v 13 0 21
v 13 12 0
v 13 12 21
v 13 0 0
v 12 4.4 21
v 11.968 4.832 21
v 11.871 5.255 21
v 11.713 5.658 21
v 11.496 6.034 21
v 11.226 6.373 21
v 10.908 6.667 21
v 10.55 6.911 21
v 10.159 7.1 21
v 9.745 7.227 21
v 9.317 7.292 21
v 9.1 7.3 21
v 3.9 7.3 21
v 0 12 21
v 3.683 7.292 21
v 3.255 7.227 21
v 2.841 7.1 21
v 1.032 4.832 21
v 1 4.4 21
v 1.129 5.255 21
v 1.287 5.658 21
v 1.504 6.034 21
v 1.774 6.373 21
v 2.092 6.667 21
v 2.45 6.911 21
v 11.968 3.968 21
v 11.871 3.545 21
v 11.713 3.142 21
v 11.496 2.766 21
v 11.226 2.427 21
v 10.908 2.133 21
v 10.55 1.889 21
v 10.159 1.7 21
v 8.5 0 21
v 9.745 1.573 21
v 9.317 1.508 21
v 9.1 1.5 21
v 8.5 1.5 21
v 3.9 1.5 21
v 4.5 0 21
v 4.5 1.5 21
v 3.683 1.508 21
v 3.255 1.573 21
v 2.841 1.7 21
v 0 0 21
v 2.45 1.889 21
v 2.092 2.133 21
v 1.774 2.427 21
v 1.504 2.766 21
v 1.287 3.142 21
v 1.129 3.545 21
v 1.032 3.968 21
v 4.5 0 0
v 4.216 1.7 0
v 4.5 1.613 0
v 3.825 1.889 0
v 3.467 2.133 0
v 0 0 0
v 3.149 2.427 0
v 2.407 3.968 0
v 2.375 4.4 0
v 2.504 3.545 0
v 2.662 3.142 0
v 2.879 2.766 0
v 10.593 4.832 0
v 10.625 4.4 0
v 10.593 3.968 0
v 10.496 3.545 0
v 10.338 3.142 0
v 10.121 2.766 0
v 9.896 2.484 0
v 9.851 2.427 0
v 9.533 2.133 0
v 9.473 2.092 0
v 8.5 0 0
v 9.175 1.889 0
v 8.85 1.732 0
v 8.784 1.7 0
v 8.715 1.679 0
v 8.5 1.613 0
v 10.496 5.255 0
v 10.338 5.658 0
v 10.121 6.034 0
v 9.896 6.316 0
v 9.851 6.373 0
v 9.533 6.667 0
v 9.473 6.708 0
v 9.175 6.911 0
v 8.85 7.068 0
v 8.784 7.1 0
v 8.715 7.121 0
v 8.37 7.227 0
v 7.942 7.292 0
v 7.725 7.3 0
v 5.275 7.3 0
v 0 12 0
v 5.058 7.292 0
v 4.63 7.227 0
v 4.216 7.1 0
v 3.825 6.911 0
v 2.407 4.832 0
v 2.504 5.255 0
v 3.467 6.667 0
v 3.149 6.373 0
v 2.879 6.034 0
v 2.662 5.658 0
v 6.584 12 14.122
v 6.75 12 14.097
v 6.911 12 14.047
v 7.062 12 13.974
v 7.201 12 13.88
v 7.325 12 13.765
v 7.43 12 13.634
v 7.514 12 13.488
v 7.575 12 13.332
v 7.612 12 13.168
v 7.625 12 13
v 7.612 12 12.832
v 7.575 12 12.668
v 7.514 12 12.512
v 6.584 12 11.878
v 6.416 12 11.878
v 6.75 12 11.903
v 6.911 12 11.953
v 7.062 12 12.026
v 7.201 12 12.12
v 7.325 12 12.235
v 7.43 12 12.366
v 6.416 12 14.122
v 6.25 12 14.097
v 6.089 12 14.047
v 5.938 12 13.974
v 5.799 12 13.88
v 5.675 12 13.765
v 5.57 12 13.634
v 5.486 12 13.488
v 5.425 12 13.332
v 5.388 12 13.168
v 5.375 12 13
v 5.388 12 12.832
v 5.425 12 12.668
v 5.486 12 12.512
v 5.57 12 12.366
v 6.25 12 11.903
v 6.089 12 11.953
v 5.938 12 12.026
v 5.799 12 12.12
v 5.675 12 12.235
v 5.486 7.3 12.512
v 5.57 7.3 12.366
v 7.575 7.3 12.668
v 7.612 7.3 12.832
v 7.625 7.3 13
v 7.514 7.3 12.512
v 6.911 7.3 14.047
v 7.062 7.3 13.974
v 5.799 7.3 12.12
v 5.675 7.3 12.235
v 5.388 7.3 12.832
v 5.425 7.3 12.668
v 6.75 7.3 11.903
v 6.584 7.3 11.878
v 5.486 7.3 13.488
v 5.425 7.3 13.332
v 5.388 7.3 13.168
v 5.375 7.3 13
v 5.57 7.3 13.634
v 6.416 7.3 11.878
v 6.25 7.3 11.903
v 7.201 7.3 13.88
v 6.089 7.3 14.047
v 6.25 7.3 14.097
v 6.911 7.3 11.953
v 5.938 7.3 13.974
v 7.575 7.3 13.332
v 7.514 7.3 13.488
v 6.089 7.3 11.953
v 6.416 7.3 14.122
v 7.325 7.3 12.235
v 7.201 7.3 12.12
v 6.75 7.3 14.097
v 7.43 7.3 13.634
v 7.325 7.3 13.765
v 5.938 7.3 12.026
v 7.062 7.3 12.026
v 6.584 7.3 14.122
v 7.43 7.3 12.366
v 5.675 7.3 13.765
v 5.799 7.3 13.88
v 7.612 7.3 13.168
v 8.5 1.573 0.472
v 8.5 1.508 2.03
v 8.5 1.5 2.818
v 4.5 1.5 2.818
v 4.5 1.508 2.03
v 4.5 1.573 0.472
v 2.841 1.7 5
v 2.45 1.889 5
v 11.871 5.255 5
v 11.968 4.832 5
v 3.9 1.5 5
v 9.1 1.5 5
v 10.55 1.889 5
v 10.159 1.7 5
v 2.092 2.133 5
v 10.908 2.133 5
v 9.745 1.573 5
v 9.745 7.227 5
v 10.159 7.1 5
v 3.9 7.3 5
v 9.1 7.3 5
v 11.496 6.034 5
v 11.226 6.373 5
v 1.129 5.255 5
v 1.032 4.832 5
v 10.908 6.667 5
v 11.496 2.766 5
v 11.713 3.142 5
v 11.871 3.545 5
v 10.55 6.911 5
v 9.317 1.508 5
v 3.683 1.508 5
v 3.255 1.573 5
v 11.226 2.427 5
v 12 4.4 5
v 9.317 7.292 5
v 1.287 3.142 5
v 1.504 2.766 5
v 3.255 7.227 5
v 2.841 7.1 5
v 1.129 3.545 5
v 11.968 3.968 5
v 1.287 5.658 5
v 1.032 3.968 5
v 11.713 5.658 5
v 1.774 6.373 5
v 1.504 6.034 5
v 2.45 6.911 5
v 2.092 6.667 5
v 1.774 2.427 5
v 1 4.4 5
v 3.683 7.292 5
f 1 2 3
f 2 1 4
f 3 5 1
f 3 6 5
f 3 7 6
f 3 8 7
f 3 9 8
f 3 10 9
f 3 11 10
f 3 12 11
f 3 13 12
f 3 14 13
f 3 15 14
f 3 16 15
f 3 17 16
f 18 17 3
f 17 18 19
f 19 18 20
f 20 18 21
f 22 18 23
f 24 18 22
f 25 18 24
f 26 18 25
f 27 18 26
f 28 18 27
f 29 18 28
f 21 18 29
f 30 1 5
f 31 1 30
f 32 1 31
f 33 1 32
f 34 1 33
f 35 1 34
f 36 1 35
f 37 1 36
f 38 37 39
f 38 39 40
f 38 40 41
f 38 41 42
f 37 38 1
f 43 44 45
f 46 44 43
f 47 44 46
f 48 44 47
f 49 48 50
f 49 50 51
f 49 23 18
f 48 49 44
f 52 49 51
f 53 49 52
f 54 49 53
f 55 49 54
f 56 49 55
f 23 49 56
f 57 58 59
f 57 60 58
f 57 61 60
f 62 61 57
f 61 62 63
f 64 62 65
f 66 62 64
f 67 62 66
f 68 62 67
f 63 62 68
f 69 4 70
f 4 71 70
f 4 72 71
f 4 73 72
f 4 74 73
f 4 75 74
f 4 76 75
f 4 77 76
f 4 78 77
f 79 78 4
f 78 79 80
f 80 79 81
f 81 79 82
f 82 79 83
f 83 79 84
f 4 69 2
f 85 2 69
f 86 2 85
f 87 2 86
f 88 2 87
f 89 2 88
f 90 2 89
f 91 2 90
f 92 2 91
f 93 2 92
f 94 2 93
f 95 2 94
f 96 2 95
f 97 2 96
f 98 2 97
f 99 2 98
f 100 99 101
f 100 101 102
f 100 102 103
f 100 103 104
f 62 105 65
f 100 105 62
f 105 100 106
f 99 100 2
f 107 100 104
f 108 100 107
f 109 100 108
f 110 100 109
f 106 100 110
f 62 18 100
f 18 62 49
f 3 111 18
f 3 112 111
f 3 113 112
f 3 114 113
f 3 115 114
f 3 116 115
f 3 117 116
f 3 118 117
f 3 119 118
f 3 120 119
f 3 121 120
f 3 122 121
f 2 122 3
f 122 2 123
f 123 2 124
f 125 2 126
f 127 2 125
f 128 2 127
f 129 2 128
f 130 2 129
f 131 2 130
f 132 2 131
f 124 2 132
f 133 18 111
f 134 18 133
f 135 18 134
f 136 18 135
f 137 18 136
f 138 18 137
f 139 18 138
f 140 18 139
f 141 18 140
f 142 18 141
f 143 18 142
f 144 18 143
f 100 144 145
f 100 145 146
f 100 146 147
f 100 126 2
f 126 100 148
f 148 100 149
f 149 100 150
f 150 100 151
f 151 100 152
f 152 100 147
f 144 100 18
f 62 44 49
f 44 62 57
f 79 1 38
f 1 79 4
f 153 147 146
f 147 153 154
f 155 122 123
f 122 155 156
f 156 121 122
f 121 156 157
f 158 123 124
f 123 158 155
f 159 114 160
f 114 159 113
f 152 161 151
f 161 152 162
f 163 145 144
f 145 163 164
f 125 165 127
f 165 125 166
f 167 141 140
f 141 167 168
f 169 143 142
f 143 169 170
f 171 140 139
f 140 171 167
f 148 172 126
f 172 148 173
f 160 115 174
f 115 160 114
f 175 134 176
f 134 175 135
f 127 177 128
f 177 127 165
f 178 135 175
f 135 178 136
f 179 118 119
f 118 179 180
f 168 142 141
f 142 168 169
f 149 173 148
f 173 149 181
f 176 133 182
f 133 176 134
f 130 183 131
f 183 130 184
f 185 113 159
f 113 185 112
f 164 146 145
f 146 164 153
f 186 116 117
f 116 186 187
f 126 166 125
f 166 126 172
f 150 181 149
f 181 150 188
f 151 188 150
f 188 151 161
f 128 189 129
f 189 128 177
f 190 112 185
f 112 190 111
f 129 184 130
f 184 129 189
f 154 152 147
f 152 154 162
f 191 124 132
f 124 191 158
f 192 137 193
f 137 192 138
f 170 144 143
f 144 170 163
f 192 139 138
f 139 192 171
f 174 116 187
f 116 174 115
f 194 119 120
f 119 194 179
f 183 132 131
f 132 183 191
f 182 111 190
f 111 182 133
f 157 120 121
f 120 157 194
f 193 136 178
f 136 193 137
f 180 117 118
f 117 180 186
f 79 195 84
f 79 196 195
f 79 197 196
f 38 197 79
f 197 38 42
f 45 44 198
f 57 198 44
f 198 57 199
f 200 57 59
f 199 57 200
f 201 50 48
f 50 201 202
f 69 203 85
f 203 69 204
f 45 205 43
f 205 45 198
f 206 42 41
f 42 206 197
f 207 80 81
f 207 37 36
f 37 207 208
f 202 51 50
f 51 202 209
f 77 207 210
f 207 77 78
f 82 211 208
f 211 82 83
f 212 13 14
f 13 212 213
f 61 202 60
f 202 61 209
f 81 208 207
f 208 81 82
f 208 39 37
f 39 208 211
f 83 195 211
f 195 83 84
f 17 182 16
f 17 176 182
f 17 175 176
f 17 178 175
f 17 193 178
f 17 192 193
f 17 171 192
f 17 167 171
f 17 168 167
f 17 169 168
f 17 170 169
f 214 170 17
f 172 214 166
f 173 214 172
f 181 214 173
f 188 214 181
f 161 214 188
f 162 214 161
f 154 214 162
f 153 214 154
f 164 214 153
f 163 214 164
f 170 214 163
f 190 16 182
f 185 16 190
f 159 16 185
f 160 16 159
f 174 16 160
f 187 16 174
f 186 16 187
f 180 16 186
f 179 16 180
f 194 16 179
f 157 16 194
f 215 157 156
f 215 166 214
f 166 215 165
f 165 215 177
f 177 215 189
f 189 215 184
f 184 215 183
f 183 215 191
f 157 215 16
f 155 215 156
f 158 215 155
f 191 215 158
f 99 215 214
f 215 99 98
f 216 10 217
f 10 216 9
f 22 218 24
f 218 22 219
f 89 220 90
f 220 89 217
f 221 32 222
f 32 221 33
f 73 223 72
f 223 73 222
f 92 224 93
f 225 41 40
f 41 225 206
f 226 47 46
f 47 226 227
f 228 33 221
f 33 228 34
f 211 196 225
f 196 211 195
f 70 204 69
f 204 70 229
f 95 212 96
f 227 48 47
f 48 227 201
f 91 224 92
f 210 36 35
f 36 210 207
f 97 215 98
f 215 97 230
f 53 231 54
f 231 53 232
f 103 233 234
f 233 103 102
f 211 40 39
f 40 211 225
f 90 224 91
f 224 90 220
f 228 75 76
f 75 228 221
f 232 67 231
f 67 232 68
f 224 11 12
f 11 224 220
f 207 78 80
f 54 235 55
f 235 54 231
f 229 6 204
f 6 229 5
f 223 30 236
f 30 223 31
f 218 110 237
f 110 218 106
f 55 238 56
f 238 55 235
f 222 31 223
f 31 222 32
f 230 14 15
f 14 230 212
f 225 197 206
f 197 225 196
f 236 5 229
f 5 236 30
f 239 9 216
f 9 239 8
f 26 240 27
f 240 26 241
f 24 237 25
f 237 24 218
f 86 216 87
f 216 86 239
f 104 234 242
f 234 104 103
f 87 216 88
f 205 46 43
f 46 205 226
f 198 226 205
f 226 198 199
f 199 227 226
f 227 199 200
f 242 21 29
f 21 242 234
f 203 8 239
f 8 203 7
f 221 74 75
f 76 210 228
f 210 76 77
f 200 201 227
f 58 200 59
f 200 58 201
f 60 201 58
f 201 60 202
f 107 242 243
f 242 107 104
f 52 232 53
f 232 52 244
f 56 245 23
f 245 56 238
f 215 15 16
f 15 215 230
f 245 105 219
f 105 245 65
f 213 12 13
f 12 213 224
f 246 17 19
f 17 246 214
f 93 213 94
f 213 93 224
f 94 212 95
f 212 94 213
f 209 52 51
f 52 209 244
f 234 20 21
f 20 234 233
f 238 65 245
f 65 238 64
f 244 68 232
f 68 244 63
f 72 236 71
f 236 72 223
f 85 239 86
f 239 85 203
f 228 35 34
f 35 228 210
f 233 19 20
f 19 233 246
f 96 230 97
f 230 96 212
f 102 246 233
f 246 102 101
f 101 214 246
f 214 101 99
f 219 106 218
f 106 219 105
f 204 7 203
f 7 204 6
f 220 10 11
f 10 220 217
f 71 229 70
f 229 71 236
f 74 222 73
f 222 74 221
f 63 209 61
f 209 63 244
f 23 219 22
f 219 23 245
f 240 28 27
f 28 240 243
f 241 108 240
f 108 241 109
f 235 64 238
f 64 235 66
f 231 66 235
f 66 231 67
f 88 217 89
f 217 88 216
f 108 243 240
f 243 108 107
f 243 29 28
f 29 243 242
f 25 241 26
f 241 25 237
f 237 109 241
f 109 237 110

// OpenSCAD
w = 13.0;
d = 12.0;
h = 21.0;

cut = 4.0;
hole = 2.25;
off = 13.0;

usb_dia = 5.8;
usb_w = 11.0;
usb_off = 1.5;

$fn = 42;

usb_bottom_h = 4.5 + 1.5;
usb_w_bottom = 7.7;

module usb_internal(h, w) {
    translate([(usb_dia - w) / 2, 0, 0]) {
        cylinder(d = usb_dia, h = h);
        
        translate([w - usb_dia, 0, 0])
        cylinder(d = usb_dia, h = h);
        
        translate([0, -usb_dia / 2, 0])
        cube([w - usb_dia, usb_dia, h]);
    }
}

module usb(h) {
    hull() {
        translate([0, 0, usb_bottom_h])
        usb_internal(h - usb_bottom_h, usb_w);
        
        usb_internal(usb_bottom_h, usb_w_bottom);
    }
}

module holder() {
    difference() {
        cube([w, d, h]);
        
        translate([w / 2, -1, off])
        rotate([-90, 0, 0])
        cylinder(d = hole, h = d + 2);
        
        translate([(w - cut) / 2, -1, -1])
        cube([cut, 5, h + 2]);
        
        translate([w / 2, usb_dia / 2 + usb_off, -1])
        usb(h + 2);
    }
}

//usb(20);
holder();
